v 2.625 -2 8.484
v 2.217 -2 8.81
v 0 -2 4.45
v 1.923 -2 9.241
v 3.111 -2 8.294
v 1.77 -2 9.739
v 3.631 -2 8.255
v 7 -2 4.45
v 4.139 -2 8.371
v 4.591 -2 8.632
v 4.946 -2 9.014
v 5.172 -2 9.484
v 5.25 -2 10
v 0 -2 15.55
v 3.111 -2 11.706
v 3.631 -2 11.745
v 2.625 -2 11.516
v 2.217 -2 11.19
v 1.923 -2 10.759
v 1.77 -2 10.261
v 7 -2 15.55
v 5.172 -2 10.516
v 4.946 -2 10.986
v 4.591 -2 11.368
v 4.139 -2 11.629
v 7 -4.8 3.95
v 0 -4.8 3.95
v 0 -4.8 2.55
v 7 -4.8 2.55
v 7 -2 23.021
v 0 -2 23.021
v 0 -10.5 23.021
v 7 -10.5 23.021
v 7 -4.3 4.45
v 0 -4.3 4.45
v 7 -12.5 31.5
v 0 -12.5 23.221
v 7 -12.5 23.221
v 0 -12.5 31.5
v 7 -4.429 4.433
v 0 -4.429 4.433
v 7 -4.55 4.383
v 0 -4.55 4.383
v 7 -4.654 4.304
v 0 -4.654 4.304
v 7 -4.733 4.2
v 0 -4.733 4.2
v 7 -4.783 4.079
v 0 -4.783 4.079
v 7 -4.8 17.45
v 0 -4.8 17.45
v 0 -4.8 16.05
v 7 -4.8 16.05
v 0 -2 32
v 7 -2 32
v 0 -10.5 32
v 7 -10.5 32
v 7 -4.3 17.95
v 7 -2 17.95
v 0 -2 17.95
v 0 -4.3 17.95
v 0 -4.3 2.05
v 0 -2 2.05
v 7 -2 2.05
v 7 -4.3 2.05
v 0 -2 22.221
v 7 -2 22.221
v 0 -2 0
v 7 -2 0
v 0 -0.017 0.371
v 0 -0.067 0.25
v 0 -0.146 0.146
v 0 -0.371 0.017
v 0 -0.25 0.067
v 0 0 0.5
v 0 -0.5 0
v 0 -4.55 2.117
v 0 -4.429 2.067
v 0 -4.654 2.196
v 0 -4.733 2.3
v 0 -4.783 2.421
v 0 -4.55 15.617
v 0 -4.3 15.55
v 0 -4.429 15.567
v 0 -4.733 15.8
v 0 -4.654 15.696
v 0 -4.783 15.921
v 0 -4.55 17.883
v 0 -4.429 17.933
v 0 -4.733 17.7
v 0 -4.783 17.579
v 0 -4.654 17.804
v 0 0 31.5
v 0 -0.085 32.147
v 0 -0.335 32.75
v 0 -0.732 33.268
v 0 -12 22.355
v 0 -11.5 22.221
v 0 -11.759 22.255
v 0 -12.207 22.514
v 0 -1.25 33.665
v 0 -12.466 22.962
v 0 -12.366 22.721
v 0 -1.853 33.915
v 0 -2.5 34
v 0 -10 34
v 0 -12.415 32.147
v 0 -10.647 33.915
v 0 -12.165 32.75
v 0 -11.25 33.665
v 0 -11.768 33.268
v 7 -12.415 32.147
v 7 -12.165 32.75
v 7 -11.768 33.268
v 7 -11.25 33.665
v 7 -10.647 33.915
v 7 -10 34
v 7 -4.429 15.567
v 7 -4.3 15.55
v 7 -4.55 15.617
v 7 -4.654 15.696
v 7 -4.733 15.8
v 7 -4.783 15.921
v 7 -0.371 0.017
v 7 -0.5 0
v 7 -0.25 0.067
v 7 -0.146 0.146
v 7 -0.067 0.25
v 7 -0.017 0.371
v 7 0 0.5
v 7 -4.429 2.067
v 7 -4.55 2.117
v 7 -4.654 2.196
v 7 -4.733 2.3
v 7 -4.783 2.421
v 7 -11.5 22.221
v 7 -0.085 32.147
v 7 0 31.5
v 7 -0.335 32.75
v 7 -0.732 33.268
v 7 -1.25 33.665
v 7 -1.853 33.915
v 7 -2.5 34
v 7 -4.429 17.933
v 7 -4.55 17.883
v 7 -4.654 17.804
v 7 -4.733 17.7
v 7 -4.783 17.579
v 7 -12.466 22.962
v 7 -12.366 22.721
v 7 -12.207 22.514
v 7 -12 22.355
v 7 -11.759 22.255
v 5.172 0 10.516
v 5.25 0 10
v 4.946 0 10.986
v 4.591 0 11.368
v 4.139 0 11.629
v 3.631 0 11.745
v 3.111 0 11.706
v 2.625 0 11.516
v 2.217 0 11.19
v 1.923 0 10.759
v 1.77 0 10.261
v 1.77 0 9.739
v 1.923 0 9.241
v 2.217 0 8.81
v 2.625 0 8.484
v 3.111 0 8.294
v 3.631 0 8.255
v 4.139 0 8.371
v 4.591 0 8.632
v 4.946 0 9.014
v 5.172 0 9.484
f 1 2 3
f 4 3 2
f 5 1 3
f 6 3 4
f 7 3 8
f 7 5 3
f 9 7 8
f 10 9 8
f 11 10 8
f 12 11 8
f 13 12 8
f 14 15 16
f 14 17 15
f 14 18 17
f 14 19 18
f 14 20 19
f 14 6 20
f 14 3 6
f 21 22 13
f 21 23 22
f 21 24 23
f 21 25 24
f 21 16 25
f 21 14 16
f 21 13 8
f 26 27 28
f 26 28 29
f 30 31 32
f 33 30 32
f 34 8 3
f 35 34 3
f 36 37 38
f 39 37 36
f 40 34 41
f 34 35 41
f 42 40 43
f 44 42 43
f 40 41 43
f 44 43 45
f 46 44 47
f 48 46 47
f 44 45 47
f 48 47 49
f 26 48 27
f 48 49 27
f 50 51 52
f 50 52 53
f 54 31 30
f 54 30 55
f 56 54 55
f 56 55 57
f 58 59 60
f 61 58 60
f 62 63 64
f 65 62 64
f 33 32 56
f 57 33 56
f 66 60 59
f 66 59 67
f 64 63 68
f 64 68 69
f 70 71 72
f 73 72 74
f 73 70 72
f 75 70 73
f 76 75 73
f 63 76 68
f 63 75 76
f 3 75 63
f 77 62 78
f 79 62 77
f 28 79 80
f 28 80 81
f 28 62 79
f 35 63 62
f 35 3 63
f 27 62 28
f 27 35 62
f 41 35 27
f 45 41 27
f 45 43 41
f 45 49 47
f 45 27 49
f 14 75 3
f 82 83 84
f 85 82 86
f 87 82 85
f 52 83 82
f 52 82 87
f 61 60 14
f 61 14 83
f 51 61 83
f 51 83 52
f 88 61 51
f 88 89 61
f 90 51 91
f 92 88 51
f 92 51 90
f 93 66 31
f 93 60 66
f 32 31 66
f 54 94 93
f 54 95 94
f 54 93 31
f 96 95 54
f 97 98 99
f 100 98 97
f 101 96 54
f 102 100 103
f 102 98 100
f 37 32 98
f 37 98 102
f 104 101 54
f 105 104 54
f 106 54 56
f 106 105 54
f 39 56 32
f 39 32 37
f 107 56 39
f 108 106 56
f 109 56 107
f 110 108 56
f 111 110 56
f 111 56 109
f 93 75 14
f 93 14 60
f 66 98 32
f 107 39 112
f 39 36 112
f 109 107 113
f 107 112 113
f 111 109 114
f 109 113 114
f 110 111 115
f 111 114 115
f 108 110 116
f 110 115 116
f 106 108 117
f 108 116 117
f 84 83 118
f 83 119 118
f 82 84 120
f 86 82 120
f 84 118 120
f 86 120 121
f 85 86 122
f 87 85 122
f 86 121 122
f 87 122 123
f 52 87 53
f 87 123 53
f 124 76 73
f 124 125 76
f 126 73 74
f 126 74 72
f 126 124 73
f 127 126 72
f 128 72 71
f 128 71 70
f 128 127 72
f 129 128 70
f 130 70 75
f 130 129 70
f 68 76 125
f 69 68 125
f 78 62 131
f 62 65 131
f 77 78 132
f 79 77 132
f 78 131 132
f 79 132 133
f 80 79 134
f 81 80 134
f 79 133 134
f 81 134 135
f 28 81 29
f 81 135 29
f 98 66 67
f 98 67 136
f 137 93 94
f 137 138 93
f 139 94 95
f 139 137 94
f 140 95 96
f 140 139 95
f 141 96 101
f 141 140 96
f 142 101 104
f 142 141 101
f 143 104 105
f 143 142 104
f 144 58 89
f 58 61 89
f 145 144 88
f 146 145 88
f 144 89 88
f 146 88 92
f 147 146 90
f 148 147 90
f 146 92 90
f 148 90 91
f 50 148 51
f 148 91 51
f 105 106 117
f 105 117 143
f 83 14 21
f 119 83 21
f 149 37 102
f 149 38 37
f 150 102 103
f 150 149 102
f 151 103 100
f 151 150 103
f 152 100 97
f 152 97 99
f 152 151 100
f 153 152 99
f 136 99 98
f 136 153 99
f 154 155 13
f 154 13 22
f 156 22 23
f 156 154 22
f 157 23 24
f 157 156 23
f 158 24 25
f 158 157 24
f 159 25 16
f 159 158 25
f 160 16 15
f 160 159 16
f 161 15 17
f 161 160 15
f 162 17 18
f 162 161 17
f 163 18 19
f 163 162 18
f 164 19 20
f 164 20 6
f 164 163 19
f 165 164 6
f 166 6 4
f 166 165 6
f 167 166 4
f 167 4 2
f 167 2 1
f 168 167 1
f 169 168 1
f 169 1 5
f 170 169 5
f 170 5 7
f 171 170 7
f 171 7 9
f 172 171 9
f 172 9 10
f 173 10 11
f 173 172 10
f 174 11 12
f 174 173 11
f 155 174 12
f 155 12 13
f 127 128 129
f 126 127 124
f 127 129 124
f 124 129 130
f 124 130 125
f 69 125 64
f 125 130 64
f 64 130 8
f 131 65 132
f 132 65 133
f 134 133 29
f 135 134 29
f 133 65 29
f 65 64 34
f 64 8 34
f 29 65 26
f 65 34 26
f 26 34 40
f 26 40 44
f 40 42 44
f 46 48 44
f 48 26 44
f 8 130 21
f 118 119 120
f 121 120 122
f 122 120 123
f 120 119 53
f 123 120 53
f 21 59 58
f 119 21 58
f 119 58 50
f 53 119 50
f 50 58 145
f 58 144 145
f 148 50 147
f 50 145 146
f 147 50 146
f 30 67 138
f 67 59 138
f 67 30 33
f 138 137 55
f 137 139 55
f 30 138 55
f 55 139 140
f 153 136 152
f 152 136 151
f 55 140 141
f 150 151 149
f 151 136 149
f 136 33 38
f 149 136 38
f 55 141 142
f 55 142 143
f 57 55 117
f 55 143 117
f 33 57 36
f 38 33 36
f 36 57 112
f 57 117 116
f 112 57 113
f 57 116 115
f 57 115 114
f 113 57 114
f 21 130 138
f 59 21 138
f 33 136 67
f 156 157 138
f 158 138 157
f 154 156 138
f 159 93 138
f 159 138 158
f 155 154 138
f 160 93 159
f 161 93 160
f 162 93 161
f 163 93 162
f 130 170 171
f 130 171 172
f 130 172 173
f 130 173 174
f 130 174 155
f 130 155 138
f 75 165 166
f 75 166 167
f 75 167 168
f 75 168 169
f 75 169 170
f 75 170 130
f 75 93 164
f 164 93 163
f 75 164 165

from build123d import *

# Parameters (mm, degrees)
F0_W     = 7
F0_H     = 20
F0_R     = 1.75
F1_DEPTH = 2
F3_DEPTH = 2.8
F4_R     = 0.5
F5_R     = 0.5
F6_W     = 8.5
F6_H     = 8.979
F7_DEPTH = 7
F8_R     = 2.5
F9_R     = 1


with BuildPart() as f1:
    # F0 (on Front) → F1 (new body)
    with BuildSketch(Plane.XZ):
        with Locations((3.5, 10)):
            Rectangle(F0_W, F0_H)
        with Locations((3.5, 10)):
            Circle(F0_R, mode=Mode.SUBTRACT)
    extrude(amount=F1_DEPTH)

    # F2 (on face) → F3 (join)
    with BuildSketch(Plane.XZ.offset(2)):
        Polygon((7, 4.45), (3.5, 4.45), (0, 4.45), (0, 2.05), (7, 2.05), align=None)
        Polygon((0, 15.55), (3.5, 15.55), (7, 15.55), (7, 17.95), (0, 17.95), align=None)
    extrude(amount=F3_DEPTH)

    # F4
    f4_edges = [f1.edges().sort_by_distance(p)[0] for p in [
        (3.5, -4.8, 2.05),
        (3.5, -4.8, 4.45),
        (3.5, -4.8, 15.55),
        (3.5, -4.8, 17.95),
    ]]
    fillet(f4_edges, radius=F4_R)

    # F5
    f5_edges = [f1.edges().sort_by_distance(p)[0] for p in [
        (3.5, 0, 0),
    ]]
    fillet(f5_edges, radius=F5_R)

    # F6 (on face) → F7 (join, through all)
    with BuildSketch(Plane(origin=(0, 0, 0), x_dir=(0, -1, 0), z_dir=(-1, 0, 0))):
        Polygon((0, 20), (2, 20), (2, 22.221), (11.03, 22.221), (12.5, 22.221), (12.5, 34), (0, 34), align=None)
        with Locations((6.25, 27.5105)):
            Rectangle(F6_W, F6_H, mode=Mode.SUBTRACT)
    extrude(amount=-F7_DEPTH)

    # F8
    f8_edges = [f1.edges().sort_by_distance(p)[0] for p in [
        (3.5, -12.5, 34),
        (3.5, 0, 34),
    ]]
    fillet(f8_edges, radius=F8_R)

    # F9
    f9_edges = [f1.edges().sort_by_distance(p)[0] for p in [
        (3.5, -12.5, 22.221),
    ]]
    fillet(f9_edges, radius=F9_R)


solid = f1.part
